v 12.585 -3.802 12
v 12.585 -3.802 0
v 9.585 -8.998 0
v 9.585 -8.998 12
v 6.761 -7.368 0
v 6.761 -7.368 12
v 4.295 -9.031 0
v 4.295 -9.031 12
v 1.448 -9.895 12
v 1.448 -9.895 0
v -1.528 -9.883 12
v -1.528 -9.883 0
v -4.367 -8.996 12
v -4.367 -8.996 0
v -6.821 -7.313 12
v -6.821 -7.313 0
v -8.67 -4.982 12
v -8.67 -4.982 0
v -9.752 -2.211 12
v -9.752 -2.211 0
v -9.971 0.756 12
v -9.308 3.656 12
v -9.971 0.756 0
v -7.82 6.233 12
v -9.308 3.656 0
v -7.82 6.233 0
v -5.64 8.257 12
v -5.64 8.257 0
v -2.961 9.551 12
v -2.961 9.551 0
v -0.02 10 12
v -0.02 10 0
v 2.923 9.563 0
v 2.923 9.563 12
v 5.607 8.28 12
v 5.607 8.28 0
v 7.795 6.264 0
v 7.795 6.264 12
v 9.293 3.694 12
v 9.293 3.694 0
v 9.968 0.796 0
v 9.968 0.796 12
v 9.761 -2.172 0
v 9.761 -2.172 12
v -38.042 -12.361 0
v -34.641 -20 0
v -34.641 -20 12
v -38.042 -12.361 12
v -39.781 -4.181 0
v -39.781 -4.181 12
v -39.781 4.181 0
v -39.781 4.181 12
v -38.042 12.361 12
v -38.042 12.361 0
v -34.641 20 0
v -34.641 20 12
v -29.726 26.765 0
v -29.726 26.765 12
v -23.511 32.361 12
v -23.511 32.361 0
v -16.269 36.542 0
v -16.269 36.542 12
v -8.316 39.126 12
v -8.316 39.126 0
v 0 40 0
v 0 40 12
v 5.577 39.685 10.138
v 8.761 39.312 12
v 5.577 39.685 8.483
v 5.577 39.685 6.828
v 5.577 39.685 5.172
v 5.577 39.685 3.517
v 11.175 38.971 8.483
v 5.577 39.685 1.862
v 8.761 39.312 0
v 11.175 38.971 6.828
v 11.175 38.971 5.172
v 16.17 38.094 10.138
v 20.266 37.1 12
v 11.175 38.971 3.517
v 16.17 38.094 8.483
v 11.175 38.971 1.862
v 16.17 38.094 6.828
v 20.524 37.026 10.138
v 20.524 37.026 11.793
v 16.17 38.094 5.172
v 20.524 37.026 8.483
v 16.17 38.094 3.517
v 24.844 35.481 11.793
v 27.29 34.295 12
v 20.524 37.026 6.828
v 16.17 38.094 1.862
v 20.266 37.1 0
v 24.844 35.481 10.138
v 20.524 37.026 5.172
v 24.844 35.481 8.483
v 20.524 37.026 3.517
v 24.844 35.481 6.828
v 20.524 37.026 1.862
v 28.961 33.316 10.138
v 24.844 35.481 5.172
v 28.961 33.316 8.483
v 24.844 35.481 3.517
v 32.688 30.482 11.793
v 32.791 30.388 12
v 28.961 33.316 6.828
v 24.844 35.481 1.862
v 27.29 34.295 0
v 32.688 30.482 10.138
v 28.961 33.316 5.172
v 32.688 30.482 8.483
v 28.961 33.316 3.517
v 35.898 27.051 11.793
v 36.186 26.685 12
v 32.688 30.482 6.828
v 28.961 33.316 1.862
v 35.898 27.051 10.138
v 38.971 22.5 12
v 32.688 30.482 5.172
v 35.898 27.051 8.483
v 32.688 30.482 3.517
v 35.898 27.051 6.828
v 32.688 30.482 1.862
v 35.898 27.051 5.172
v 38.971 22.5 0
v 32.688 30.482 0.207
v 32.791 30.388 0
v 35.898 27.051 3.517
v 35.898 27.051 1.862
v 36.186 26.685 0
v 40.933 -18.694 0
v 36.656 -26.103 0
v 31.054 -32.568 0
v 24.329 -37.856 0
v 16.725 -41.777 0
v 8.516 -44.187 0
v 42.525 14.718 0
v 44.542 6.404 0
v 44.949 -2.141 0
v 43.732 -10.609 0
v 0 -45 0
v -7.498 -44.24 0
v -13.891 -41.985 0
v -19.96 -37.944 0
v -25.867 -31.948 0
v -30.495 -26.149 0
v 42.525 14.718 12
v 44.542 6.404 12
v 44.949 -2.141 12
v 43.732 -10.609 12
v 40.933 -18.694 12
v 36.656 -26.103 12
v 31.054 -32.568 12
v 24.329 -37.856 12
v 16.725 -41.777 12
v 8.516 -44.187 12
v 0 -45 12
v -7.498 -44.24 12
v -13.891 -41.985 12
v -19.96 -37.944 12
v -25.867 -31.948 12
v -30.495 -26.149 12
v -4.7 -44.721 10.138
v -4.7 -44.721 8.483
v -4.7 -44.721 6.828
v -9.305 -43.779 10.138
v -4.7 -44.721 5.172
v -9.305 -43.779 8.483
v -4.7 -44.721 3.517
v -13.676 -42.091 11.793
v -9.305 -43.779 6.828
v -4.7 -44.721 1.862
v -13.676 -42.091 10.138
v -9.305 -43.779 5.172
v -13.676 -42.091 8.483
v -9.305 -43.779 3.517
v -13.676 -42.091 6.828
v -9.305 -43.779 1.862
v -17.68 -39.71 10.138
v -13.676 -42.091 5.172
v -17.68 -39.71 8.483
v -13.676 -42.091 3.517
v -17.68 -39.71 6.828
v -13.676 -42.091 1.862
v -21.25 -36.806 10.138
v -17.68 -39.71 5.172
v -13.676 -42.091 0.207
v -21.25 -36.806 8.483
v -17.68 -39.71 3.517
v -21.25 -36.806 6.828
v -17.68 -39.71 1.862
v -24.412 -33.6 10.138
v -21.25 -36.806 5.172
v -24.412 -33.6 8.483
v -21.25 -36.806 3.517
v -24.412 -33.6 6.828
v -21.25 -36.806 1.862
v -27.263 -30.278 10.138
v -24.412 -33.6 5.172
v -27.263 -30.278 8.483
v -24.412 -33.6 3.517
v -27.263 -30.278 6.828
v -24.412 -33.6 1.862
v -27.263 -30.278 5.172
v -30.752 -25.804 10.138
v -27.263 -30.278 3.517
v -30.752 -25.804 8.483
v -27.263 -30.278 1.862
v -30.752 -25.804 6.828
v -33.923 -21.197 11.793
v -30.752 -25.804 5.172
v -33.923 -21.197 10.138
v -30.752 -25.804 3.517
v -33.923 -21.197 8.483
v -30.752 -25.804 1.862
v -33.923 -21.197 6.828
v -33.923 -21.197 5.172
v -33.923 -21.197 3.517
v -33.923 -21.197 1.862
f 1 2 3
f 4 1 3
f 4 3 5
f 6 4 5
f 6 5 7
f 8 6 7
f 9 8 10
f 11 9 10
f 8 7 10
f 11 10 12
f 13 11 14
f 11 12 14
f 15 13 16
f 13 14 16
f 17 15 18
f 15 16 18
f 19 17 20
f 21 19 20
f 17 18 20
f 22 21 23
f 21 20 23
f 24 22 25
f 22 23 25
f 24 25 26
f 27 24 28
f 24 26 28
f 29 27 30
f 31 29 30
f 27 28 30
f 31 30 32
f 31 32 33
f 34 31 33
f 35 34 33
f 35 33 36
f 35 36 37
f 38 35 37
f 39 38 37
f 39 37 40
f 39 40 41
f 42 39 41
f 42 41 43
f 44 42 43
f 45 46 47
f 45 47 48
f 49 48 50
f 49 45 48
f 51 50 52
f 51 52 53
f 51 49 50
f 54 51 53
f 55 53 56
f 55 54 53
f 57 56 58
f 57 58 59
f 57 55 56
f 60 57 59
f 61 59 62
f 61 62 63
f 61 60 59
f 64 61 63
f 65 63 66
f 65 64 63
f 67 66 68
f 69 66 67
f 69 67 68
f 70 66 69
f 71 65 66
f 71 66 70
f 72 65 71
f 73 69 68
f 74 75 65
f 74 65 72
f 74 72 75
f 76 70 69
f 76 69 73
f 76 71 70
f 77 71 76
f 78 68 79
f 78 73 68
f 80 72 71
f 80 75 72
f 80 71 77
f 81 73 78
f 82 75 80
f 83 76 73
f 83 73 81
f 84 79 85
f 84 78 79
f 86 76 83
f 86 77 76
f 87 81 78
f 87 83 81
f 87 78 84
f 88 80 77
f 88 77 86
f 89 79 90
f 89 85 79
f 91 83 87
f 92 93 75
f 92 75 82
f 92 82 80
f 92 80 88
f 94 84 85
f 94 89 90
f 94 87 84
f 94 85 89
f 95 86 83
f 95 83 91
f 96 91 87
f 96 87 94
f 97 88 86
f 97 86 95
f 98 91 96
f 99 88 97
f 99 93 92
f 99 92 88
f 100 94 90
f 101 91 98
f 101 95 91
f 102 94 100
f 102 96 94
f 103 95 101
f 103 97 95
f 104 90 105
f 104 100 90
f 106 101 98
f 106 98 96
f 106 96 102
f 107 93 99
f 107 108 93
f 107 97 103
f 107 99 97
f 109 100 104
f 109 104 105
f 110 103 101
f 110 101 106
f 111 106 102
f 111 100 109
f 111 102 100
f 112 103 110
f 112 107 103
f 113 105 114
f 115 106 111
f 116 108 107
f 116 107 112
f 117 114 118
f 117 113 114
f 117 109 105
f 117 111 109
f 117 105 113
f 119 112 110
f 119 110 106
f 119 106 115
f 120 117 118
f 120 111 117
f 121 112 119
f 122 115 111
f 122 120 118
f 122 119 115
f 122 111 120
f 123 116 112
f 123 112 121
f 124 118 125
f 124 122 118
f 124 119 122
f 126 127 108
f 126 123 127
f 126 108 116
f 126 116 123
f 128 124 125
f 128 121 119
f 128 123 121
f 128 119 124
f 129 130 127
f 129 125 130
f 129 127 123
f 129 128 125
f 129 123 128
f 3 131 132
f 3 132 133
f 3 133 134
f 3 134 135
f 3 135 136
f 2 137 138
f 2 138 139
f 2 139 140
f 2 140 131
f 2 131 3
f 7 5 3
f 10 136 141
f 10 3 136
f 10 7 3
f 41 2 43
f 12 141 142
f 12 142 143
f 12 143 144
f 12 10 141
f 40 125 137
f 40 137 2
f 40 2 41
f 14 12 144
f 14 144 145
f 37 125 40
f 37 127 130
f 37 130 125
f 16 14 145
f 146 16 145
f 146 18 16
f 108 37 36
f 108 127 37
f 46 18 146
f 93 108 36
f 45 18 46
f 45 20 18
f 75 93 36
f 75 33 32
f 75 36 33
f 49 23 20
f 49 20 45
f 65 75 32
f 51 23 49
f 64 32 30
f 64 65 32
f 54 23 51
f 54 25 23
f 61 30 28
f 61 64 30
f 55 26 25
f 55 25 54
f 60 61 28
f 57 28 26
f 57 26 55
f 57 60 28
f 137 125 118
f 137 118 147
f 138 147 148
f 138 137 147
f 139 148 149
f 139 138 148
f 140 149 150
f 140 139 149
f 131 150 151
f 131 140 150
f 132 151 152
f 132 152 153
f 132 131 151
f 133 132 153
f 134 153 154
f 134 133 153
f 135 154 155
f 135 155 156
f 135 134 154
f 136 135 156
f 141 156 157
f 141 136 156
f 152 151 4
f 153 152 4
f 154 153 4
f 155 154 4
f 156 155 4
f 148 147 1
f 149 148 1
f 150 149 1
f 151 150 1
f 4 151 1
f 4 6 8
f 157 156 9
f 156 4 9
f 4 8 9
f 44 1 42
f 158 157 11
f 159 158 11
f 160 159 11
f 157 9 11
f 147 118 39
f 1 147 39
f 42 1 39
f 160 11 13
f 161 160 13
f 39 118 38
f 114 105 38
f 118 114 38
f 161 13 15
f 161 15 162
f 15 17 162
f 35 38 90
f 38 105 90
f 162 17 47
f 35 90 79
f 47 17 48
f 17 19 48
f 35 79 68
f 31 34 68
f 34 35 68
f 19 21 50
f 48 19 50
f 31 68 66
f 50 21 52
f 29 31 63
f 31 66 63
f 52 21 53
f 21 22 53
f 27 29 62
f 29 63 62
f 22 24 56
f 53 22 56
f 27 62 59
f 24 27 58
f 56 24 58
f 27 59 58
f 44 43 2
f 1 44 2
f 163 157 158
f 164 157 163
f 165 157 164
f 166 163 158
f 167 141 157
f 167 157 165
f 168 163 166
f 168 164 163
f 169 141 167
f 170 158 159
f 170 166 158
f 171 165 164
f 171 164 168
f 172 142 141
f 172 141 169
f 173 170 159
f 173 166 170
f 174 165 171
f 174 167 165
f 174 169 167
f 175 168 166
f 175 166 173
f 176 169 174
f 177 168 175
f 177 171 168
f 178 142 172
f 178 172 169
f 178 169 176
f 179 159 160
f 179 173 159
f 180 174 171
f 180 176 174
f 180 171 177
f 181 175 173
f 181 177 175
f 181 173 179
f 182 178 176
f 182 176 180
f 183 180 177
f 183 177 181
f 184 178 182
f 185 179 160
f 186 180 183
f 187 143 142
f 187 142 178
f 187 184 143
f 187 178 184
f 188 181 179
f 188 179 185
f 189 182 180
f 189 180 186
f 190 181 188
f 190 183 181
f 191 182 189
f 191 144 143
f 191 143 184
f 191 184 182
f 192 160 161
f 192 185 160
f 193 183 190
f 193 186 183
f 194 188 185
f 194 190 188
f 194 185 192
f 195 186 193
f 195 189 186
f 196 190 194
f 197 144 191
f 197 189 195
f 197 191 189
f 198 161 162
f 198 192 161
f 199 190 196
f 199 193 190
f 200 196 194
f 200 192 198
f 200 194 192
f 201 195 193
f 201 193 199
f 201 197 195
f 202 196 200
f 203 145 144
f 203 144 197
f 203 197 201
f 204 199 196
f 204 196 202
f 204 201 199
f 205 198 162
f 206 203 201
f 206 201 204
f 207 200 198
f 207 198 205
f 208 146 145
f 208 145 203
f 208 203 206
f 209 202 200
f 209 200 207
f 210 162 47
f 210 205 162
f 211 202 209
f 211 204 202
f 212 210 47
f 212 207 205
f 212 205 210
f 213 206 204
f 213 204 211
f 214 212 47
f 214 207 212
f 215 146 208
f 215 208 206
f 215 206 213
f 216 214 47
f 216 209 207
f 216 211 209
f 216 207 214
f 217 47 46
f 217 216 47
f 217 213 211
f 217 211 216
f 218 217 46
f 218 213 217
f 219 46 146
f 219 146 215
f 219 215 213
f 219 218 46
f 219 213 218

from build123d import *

# Parameters (mm, degrees)
EXTRUDE_1_DEPTH          = 12
CUT_EXTRUDE_1_DEPTH      = 12
CUT_EXTRUDE_1_DEPTH_BACK = 12


with BuildPart() as part:
    # 草图1 → 凸台-拉伸1 (new body)
    with BuildSketch(Plane.XY):
        with BuildLine():
            ThreePointArc((38.97114317, 22.5), (38.97114317, -22.5), (0, -45))
            add(Edge.make_bspline(
                [(0, -45), (-0.523588562, -45.000001824), (-1.308996546, -44.986287154), (-2.355040538, -44.936973624), (-3.138561651, -44.883613379), (-3.920631292, -44.813054932), (-4.70074178, -44.724529495), (-5.478335846, -44.617332694), (-6.252812136, -44.490834911), (-7.02353199, -44.344490532), (-7.789826844, -44.177846129), (-8.551006285, -43.990547434), (-9.306366601, -43.782344994), (-10.055199679, -43.553098452), (-10.796802122, -43.302779375), (-11.530484409, -43.031472601), (-12.255579979, -42.73937609), (-12.971454051, -42.426799279), (-13.677512056, -42.09415998), (-14.37320753, -41.741979863), (-15.05804933, -41.370878602), (-15.731608057, -40.981566772), (-16.393521567, -40.574837604), (-17.043499489, -40.151557733), (-17.681326658, -39.712657057), (-18.306865404, -39.259117879), (-18.920056659, -38.791963465), (-19.520919847, -38.312246209), (-20.109551561, -37.821035543), (-20.686123026, -37.31940579), (-21.250876386, -36.808424103), (-21.804119858, -36.289138682), (-22.346221822, -35.762567407), (-22.877603916, -35.229687052), (-23.398733251, -34.691423221), (-23.910113836, -34.148641142), (-24.412277346, -33.602137436), (-24.905773374, -33.052632959), (-25.391159289, -32.500766815), (-25.868989871, -31.947091613), (-26.339806873, -31.392070001), (-26.804128666, -30.836072544), (-27.262440122, -30.279376925), (-27.715182905, -29.7221685), (-28.162746317, -29.164542162), (-28.605458836, -28.606505484), (-29.043580492, -28.047983083), (-29.477296206, -27.488822134), (-29.90671018, -26.928798938), (-30.331841461, -26.367626442), (-30.75262073, -25.804962595), (-31.168888381, -25.240419403), (-31.580393929, -24.673572552), (-31.986796771, -24.103971433), (-32.387668279, -23.531149436), (-32.782495247, -22.954634315), (-33.170684562, -22.373958572), (-33.551569347, -21.788669334), (-34.048685337, -21.001581207), (-34.408299842, -20.403074718), (-34.641016151, -20)],
                knots=[0, 0, 0, 0, 0.03496569, 0.052447761, 0.069928514, 0.087407152, 0.104882797, 0.122354544, 0.139821494, 0.157282786, 0.174737606, 0.19218518, 0.209624761, 0.227055593, 0.244476873, 0.261887701, 0.279287021, 0.296673569, 0.314045814, 0.331401914, 0.348739666, 0.366056487, 0.383349391, 0.400614991, 0.41784952, 0.435048865, 0.452208618, 0.469324147, 0.486390681, 0.50340341, 0.520357584, 0.537248637, 0.554072295, 0.570824701, 0.587502516, 0.604103031, 0.620624249, 0.637064964, 0.653424809, 0.669704291, 0.685904798, 0.702028578, 0.718078697, 0.734058971, 0.749973875, 0.765828434, 0.781628096, 0.797378593, 0.813085806, 0.828755612, 0.844393755, 0.860005715, 0.875596595, 0.891171031, 0.906733116, 0.922286353, 0.937833634, 0.953377231, 0.968918825, 1, 1, 1, 1], degree=3))
            ThreePointArc((-34.641016151, -20), (-34.641016151, 20), (0, 40))
            add(Edge.make_bspline(
                [(0, 40), (0.4654311, 39.999999123), (1.163560176, 39.987817071), (2.093756484, 39.950846058), (2.791074225, 39.913634778), (3.488048828, 39.867790841), (4.184739053, 39.814118217), (4.881253208, 39.753364306), (5.577743667, 39.68620968), (6.274400215, 39.613258847), (6.971442786, 39.535032082), (7.669113606, 39.45195847), (8.367668884, 39.364370228), (9.067370185, 39.272498416), (9.768475628, 39.176470065), (10.471231044, 39.07630678), (11.175861244, 38.971924832), (11.882561524, 38.863136716), (12.591489567, 38.749654177), (13.302757843, 38.631092623), (14.016426662, 38.506976884), (14.732497978, 38.376748205), (15.45091006, 38.239772383), (16.171533117, 38.095348923), (16.894165968, 37.942721064), (17.618533816, 37.78108656), (18.344287177, 37.609609022), (19.071001996, 37.427429695), (19.798180969, 37.23367948), (20.525256051, 37.027491046), (21.251592153, 36.808010854), (21.976491955, 36.574410941), (22.699201797, 36.325900283), (23.41891857, 36.061735598), (24.134797494, 35.78123144), (24.845960711, 35.483769443), (25.551506534, 35.168806587), (26.250519254, 34.835882393), (26.942079336, 34.484624936), (27.625273883, 34.114755605), (28.299207181, 33.726092553), (28.963011201, 33.318552786), (29.615855866, 32.892152891), (30.256958951, 32.447008371), (30.885595446, 31.983331645), (31.50110623, 31.501428717), (32.102905932, 31.001694605), (32.690489833, 30.484607589), (33.263439702, 29.95072239), (33.821428462, 29.400662388), (34.36422361, 28.835111002), (34.891689323, 28.254802394), (35.403787201, 27.66051161), (35.900575639, 27.05304436), (36.382207825, 26.433226546), (36.848928347, 25.801893764), (37.301068575, 25.15988081), (37.739040459, 24.508011745), (38.304769224, 23.62676784), (38.709350469, 22.953441907), (38.97114317, 22.5)],
                knots=[0, 0, 0, 0, 0.031081175, 0.046622769, 0.062166366, 0.077713647, 0.093266884, 0.108828969, 0.124403405, 0.139994285, 0.155606245, 0.171244388, 0.186914194, 0.202621407, 0.218371904, 0.234171566, 0.250026125, 0.265941029, 0.281921303, 0.297971422, 0.314095202, 0.330295709, 0.346575191, 0.362935036, 0.379375751, 0.395896969, 0.412497484, 0.429175299, 0.445927705, 0.462751363, 0.479642416, 0.49659659, 0.513609319, 0.530675853, 0.547791382, 0.564951135, 0.58215048, 0.599385009, 0.616650609, 0.633943513, 0.651260334, 0.668598086, 0.685954186, 0.703326431, 0.720712979, 0.738112299, 0.755523127, 0.772944407, 0.790375239, 0.80781482, 0.825262394, 0.842717214, 0.860178506, 0.877645456, 0.895117203, 0.912592848, 0.930071486, 0.947552239, 0.96503431, 1, 1, 1, 1], degree=3))
        make_face()
    extrude(amount=EXTRUDE_1_DEPTH)

    # 草图2 → 切除-拉伸1 (cut, two sides: drawn at the far end of the back side and taken through both)
    with BuildSketch(Plane.XY.offset(-CUT_EXTRUDE_1_DEPTH_BACK)):
        with BuildLine():
            Line((9.761355821, -2.171619796), (12.585125127, -3.801923765))
            Line((12.585125127, -3.801923765), (9.585125127, -8.998076188))
            Line((9.585125127, -8.998076188), (6.761355821, -7.367772218))
            ThreePointArc((6.761355821, -7.367772218), (-8.660254038, 5), (9.761355821, -2.171619796))
        make_face()
    extrude(amount=CUT_EXTRUDE_1_DEPTH + CUT_EXTRUDE_1_DEPTH_BACK, mode=Mode.SUBTRACT)


solid = part.part
